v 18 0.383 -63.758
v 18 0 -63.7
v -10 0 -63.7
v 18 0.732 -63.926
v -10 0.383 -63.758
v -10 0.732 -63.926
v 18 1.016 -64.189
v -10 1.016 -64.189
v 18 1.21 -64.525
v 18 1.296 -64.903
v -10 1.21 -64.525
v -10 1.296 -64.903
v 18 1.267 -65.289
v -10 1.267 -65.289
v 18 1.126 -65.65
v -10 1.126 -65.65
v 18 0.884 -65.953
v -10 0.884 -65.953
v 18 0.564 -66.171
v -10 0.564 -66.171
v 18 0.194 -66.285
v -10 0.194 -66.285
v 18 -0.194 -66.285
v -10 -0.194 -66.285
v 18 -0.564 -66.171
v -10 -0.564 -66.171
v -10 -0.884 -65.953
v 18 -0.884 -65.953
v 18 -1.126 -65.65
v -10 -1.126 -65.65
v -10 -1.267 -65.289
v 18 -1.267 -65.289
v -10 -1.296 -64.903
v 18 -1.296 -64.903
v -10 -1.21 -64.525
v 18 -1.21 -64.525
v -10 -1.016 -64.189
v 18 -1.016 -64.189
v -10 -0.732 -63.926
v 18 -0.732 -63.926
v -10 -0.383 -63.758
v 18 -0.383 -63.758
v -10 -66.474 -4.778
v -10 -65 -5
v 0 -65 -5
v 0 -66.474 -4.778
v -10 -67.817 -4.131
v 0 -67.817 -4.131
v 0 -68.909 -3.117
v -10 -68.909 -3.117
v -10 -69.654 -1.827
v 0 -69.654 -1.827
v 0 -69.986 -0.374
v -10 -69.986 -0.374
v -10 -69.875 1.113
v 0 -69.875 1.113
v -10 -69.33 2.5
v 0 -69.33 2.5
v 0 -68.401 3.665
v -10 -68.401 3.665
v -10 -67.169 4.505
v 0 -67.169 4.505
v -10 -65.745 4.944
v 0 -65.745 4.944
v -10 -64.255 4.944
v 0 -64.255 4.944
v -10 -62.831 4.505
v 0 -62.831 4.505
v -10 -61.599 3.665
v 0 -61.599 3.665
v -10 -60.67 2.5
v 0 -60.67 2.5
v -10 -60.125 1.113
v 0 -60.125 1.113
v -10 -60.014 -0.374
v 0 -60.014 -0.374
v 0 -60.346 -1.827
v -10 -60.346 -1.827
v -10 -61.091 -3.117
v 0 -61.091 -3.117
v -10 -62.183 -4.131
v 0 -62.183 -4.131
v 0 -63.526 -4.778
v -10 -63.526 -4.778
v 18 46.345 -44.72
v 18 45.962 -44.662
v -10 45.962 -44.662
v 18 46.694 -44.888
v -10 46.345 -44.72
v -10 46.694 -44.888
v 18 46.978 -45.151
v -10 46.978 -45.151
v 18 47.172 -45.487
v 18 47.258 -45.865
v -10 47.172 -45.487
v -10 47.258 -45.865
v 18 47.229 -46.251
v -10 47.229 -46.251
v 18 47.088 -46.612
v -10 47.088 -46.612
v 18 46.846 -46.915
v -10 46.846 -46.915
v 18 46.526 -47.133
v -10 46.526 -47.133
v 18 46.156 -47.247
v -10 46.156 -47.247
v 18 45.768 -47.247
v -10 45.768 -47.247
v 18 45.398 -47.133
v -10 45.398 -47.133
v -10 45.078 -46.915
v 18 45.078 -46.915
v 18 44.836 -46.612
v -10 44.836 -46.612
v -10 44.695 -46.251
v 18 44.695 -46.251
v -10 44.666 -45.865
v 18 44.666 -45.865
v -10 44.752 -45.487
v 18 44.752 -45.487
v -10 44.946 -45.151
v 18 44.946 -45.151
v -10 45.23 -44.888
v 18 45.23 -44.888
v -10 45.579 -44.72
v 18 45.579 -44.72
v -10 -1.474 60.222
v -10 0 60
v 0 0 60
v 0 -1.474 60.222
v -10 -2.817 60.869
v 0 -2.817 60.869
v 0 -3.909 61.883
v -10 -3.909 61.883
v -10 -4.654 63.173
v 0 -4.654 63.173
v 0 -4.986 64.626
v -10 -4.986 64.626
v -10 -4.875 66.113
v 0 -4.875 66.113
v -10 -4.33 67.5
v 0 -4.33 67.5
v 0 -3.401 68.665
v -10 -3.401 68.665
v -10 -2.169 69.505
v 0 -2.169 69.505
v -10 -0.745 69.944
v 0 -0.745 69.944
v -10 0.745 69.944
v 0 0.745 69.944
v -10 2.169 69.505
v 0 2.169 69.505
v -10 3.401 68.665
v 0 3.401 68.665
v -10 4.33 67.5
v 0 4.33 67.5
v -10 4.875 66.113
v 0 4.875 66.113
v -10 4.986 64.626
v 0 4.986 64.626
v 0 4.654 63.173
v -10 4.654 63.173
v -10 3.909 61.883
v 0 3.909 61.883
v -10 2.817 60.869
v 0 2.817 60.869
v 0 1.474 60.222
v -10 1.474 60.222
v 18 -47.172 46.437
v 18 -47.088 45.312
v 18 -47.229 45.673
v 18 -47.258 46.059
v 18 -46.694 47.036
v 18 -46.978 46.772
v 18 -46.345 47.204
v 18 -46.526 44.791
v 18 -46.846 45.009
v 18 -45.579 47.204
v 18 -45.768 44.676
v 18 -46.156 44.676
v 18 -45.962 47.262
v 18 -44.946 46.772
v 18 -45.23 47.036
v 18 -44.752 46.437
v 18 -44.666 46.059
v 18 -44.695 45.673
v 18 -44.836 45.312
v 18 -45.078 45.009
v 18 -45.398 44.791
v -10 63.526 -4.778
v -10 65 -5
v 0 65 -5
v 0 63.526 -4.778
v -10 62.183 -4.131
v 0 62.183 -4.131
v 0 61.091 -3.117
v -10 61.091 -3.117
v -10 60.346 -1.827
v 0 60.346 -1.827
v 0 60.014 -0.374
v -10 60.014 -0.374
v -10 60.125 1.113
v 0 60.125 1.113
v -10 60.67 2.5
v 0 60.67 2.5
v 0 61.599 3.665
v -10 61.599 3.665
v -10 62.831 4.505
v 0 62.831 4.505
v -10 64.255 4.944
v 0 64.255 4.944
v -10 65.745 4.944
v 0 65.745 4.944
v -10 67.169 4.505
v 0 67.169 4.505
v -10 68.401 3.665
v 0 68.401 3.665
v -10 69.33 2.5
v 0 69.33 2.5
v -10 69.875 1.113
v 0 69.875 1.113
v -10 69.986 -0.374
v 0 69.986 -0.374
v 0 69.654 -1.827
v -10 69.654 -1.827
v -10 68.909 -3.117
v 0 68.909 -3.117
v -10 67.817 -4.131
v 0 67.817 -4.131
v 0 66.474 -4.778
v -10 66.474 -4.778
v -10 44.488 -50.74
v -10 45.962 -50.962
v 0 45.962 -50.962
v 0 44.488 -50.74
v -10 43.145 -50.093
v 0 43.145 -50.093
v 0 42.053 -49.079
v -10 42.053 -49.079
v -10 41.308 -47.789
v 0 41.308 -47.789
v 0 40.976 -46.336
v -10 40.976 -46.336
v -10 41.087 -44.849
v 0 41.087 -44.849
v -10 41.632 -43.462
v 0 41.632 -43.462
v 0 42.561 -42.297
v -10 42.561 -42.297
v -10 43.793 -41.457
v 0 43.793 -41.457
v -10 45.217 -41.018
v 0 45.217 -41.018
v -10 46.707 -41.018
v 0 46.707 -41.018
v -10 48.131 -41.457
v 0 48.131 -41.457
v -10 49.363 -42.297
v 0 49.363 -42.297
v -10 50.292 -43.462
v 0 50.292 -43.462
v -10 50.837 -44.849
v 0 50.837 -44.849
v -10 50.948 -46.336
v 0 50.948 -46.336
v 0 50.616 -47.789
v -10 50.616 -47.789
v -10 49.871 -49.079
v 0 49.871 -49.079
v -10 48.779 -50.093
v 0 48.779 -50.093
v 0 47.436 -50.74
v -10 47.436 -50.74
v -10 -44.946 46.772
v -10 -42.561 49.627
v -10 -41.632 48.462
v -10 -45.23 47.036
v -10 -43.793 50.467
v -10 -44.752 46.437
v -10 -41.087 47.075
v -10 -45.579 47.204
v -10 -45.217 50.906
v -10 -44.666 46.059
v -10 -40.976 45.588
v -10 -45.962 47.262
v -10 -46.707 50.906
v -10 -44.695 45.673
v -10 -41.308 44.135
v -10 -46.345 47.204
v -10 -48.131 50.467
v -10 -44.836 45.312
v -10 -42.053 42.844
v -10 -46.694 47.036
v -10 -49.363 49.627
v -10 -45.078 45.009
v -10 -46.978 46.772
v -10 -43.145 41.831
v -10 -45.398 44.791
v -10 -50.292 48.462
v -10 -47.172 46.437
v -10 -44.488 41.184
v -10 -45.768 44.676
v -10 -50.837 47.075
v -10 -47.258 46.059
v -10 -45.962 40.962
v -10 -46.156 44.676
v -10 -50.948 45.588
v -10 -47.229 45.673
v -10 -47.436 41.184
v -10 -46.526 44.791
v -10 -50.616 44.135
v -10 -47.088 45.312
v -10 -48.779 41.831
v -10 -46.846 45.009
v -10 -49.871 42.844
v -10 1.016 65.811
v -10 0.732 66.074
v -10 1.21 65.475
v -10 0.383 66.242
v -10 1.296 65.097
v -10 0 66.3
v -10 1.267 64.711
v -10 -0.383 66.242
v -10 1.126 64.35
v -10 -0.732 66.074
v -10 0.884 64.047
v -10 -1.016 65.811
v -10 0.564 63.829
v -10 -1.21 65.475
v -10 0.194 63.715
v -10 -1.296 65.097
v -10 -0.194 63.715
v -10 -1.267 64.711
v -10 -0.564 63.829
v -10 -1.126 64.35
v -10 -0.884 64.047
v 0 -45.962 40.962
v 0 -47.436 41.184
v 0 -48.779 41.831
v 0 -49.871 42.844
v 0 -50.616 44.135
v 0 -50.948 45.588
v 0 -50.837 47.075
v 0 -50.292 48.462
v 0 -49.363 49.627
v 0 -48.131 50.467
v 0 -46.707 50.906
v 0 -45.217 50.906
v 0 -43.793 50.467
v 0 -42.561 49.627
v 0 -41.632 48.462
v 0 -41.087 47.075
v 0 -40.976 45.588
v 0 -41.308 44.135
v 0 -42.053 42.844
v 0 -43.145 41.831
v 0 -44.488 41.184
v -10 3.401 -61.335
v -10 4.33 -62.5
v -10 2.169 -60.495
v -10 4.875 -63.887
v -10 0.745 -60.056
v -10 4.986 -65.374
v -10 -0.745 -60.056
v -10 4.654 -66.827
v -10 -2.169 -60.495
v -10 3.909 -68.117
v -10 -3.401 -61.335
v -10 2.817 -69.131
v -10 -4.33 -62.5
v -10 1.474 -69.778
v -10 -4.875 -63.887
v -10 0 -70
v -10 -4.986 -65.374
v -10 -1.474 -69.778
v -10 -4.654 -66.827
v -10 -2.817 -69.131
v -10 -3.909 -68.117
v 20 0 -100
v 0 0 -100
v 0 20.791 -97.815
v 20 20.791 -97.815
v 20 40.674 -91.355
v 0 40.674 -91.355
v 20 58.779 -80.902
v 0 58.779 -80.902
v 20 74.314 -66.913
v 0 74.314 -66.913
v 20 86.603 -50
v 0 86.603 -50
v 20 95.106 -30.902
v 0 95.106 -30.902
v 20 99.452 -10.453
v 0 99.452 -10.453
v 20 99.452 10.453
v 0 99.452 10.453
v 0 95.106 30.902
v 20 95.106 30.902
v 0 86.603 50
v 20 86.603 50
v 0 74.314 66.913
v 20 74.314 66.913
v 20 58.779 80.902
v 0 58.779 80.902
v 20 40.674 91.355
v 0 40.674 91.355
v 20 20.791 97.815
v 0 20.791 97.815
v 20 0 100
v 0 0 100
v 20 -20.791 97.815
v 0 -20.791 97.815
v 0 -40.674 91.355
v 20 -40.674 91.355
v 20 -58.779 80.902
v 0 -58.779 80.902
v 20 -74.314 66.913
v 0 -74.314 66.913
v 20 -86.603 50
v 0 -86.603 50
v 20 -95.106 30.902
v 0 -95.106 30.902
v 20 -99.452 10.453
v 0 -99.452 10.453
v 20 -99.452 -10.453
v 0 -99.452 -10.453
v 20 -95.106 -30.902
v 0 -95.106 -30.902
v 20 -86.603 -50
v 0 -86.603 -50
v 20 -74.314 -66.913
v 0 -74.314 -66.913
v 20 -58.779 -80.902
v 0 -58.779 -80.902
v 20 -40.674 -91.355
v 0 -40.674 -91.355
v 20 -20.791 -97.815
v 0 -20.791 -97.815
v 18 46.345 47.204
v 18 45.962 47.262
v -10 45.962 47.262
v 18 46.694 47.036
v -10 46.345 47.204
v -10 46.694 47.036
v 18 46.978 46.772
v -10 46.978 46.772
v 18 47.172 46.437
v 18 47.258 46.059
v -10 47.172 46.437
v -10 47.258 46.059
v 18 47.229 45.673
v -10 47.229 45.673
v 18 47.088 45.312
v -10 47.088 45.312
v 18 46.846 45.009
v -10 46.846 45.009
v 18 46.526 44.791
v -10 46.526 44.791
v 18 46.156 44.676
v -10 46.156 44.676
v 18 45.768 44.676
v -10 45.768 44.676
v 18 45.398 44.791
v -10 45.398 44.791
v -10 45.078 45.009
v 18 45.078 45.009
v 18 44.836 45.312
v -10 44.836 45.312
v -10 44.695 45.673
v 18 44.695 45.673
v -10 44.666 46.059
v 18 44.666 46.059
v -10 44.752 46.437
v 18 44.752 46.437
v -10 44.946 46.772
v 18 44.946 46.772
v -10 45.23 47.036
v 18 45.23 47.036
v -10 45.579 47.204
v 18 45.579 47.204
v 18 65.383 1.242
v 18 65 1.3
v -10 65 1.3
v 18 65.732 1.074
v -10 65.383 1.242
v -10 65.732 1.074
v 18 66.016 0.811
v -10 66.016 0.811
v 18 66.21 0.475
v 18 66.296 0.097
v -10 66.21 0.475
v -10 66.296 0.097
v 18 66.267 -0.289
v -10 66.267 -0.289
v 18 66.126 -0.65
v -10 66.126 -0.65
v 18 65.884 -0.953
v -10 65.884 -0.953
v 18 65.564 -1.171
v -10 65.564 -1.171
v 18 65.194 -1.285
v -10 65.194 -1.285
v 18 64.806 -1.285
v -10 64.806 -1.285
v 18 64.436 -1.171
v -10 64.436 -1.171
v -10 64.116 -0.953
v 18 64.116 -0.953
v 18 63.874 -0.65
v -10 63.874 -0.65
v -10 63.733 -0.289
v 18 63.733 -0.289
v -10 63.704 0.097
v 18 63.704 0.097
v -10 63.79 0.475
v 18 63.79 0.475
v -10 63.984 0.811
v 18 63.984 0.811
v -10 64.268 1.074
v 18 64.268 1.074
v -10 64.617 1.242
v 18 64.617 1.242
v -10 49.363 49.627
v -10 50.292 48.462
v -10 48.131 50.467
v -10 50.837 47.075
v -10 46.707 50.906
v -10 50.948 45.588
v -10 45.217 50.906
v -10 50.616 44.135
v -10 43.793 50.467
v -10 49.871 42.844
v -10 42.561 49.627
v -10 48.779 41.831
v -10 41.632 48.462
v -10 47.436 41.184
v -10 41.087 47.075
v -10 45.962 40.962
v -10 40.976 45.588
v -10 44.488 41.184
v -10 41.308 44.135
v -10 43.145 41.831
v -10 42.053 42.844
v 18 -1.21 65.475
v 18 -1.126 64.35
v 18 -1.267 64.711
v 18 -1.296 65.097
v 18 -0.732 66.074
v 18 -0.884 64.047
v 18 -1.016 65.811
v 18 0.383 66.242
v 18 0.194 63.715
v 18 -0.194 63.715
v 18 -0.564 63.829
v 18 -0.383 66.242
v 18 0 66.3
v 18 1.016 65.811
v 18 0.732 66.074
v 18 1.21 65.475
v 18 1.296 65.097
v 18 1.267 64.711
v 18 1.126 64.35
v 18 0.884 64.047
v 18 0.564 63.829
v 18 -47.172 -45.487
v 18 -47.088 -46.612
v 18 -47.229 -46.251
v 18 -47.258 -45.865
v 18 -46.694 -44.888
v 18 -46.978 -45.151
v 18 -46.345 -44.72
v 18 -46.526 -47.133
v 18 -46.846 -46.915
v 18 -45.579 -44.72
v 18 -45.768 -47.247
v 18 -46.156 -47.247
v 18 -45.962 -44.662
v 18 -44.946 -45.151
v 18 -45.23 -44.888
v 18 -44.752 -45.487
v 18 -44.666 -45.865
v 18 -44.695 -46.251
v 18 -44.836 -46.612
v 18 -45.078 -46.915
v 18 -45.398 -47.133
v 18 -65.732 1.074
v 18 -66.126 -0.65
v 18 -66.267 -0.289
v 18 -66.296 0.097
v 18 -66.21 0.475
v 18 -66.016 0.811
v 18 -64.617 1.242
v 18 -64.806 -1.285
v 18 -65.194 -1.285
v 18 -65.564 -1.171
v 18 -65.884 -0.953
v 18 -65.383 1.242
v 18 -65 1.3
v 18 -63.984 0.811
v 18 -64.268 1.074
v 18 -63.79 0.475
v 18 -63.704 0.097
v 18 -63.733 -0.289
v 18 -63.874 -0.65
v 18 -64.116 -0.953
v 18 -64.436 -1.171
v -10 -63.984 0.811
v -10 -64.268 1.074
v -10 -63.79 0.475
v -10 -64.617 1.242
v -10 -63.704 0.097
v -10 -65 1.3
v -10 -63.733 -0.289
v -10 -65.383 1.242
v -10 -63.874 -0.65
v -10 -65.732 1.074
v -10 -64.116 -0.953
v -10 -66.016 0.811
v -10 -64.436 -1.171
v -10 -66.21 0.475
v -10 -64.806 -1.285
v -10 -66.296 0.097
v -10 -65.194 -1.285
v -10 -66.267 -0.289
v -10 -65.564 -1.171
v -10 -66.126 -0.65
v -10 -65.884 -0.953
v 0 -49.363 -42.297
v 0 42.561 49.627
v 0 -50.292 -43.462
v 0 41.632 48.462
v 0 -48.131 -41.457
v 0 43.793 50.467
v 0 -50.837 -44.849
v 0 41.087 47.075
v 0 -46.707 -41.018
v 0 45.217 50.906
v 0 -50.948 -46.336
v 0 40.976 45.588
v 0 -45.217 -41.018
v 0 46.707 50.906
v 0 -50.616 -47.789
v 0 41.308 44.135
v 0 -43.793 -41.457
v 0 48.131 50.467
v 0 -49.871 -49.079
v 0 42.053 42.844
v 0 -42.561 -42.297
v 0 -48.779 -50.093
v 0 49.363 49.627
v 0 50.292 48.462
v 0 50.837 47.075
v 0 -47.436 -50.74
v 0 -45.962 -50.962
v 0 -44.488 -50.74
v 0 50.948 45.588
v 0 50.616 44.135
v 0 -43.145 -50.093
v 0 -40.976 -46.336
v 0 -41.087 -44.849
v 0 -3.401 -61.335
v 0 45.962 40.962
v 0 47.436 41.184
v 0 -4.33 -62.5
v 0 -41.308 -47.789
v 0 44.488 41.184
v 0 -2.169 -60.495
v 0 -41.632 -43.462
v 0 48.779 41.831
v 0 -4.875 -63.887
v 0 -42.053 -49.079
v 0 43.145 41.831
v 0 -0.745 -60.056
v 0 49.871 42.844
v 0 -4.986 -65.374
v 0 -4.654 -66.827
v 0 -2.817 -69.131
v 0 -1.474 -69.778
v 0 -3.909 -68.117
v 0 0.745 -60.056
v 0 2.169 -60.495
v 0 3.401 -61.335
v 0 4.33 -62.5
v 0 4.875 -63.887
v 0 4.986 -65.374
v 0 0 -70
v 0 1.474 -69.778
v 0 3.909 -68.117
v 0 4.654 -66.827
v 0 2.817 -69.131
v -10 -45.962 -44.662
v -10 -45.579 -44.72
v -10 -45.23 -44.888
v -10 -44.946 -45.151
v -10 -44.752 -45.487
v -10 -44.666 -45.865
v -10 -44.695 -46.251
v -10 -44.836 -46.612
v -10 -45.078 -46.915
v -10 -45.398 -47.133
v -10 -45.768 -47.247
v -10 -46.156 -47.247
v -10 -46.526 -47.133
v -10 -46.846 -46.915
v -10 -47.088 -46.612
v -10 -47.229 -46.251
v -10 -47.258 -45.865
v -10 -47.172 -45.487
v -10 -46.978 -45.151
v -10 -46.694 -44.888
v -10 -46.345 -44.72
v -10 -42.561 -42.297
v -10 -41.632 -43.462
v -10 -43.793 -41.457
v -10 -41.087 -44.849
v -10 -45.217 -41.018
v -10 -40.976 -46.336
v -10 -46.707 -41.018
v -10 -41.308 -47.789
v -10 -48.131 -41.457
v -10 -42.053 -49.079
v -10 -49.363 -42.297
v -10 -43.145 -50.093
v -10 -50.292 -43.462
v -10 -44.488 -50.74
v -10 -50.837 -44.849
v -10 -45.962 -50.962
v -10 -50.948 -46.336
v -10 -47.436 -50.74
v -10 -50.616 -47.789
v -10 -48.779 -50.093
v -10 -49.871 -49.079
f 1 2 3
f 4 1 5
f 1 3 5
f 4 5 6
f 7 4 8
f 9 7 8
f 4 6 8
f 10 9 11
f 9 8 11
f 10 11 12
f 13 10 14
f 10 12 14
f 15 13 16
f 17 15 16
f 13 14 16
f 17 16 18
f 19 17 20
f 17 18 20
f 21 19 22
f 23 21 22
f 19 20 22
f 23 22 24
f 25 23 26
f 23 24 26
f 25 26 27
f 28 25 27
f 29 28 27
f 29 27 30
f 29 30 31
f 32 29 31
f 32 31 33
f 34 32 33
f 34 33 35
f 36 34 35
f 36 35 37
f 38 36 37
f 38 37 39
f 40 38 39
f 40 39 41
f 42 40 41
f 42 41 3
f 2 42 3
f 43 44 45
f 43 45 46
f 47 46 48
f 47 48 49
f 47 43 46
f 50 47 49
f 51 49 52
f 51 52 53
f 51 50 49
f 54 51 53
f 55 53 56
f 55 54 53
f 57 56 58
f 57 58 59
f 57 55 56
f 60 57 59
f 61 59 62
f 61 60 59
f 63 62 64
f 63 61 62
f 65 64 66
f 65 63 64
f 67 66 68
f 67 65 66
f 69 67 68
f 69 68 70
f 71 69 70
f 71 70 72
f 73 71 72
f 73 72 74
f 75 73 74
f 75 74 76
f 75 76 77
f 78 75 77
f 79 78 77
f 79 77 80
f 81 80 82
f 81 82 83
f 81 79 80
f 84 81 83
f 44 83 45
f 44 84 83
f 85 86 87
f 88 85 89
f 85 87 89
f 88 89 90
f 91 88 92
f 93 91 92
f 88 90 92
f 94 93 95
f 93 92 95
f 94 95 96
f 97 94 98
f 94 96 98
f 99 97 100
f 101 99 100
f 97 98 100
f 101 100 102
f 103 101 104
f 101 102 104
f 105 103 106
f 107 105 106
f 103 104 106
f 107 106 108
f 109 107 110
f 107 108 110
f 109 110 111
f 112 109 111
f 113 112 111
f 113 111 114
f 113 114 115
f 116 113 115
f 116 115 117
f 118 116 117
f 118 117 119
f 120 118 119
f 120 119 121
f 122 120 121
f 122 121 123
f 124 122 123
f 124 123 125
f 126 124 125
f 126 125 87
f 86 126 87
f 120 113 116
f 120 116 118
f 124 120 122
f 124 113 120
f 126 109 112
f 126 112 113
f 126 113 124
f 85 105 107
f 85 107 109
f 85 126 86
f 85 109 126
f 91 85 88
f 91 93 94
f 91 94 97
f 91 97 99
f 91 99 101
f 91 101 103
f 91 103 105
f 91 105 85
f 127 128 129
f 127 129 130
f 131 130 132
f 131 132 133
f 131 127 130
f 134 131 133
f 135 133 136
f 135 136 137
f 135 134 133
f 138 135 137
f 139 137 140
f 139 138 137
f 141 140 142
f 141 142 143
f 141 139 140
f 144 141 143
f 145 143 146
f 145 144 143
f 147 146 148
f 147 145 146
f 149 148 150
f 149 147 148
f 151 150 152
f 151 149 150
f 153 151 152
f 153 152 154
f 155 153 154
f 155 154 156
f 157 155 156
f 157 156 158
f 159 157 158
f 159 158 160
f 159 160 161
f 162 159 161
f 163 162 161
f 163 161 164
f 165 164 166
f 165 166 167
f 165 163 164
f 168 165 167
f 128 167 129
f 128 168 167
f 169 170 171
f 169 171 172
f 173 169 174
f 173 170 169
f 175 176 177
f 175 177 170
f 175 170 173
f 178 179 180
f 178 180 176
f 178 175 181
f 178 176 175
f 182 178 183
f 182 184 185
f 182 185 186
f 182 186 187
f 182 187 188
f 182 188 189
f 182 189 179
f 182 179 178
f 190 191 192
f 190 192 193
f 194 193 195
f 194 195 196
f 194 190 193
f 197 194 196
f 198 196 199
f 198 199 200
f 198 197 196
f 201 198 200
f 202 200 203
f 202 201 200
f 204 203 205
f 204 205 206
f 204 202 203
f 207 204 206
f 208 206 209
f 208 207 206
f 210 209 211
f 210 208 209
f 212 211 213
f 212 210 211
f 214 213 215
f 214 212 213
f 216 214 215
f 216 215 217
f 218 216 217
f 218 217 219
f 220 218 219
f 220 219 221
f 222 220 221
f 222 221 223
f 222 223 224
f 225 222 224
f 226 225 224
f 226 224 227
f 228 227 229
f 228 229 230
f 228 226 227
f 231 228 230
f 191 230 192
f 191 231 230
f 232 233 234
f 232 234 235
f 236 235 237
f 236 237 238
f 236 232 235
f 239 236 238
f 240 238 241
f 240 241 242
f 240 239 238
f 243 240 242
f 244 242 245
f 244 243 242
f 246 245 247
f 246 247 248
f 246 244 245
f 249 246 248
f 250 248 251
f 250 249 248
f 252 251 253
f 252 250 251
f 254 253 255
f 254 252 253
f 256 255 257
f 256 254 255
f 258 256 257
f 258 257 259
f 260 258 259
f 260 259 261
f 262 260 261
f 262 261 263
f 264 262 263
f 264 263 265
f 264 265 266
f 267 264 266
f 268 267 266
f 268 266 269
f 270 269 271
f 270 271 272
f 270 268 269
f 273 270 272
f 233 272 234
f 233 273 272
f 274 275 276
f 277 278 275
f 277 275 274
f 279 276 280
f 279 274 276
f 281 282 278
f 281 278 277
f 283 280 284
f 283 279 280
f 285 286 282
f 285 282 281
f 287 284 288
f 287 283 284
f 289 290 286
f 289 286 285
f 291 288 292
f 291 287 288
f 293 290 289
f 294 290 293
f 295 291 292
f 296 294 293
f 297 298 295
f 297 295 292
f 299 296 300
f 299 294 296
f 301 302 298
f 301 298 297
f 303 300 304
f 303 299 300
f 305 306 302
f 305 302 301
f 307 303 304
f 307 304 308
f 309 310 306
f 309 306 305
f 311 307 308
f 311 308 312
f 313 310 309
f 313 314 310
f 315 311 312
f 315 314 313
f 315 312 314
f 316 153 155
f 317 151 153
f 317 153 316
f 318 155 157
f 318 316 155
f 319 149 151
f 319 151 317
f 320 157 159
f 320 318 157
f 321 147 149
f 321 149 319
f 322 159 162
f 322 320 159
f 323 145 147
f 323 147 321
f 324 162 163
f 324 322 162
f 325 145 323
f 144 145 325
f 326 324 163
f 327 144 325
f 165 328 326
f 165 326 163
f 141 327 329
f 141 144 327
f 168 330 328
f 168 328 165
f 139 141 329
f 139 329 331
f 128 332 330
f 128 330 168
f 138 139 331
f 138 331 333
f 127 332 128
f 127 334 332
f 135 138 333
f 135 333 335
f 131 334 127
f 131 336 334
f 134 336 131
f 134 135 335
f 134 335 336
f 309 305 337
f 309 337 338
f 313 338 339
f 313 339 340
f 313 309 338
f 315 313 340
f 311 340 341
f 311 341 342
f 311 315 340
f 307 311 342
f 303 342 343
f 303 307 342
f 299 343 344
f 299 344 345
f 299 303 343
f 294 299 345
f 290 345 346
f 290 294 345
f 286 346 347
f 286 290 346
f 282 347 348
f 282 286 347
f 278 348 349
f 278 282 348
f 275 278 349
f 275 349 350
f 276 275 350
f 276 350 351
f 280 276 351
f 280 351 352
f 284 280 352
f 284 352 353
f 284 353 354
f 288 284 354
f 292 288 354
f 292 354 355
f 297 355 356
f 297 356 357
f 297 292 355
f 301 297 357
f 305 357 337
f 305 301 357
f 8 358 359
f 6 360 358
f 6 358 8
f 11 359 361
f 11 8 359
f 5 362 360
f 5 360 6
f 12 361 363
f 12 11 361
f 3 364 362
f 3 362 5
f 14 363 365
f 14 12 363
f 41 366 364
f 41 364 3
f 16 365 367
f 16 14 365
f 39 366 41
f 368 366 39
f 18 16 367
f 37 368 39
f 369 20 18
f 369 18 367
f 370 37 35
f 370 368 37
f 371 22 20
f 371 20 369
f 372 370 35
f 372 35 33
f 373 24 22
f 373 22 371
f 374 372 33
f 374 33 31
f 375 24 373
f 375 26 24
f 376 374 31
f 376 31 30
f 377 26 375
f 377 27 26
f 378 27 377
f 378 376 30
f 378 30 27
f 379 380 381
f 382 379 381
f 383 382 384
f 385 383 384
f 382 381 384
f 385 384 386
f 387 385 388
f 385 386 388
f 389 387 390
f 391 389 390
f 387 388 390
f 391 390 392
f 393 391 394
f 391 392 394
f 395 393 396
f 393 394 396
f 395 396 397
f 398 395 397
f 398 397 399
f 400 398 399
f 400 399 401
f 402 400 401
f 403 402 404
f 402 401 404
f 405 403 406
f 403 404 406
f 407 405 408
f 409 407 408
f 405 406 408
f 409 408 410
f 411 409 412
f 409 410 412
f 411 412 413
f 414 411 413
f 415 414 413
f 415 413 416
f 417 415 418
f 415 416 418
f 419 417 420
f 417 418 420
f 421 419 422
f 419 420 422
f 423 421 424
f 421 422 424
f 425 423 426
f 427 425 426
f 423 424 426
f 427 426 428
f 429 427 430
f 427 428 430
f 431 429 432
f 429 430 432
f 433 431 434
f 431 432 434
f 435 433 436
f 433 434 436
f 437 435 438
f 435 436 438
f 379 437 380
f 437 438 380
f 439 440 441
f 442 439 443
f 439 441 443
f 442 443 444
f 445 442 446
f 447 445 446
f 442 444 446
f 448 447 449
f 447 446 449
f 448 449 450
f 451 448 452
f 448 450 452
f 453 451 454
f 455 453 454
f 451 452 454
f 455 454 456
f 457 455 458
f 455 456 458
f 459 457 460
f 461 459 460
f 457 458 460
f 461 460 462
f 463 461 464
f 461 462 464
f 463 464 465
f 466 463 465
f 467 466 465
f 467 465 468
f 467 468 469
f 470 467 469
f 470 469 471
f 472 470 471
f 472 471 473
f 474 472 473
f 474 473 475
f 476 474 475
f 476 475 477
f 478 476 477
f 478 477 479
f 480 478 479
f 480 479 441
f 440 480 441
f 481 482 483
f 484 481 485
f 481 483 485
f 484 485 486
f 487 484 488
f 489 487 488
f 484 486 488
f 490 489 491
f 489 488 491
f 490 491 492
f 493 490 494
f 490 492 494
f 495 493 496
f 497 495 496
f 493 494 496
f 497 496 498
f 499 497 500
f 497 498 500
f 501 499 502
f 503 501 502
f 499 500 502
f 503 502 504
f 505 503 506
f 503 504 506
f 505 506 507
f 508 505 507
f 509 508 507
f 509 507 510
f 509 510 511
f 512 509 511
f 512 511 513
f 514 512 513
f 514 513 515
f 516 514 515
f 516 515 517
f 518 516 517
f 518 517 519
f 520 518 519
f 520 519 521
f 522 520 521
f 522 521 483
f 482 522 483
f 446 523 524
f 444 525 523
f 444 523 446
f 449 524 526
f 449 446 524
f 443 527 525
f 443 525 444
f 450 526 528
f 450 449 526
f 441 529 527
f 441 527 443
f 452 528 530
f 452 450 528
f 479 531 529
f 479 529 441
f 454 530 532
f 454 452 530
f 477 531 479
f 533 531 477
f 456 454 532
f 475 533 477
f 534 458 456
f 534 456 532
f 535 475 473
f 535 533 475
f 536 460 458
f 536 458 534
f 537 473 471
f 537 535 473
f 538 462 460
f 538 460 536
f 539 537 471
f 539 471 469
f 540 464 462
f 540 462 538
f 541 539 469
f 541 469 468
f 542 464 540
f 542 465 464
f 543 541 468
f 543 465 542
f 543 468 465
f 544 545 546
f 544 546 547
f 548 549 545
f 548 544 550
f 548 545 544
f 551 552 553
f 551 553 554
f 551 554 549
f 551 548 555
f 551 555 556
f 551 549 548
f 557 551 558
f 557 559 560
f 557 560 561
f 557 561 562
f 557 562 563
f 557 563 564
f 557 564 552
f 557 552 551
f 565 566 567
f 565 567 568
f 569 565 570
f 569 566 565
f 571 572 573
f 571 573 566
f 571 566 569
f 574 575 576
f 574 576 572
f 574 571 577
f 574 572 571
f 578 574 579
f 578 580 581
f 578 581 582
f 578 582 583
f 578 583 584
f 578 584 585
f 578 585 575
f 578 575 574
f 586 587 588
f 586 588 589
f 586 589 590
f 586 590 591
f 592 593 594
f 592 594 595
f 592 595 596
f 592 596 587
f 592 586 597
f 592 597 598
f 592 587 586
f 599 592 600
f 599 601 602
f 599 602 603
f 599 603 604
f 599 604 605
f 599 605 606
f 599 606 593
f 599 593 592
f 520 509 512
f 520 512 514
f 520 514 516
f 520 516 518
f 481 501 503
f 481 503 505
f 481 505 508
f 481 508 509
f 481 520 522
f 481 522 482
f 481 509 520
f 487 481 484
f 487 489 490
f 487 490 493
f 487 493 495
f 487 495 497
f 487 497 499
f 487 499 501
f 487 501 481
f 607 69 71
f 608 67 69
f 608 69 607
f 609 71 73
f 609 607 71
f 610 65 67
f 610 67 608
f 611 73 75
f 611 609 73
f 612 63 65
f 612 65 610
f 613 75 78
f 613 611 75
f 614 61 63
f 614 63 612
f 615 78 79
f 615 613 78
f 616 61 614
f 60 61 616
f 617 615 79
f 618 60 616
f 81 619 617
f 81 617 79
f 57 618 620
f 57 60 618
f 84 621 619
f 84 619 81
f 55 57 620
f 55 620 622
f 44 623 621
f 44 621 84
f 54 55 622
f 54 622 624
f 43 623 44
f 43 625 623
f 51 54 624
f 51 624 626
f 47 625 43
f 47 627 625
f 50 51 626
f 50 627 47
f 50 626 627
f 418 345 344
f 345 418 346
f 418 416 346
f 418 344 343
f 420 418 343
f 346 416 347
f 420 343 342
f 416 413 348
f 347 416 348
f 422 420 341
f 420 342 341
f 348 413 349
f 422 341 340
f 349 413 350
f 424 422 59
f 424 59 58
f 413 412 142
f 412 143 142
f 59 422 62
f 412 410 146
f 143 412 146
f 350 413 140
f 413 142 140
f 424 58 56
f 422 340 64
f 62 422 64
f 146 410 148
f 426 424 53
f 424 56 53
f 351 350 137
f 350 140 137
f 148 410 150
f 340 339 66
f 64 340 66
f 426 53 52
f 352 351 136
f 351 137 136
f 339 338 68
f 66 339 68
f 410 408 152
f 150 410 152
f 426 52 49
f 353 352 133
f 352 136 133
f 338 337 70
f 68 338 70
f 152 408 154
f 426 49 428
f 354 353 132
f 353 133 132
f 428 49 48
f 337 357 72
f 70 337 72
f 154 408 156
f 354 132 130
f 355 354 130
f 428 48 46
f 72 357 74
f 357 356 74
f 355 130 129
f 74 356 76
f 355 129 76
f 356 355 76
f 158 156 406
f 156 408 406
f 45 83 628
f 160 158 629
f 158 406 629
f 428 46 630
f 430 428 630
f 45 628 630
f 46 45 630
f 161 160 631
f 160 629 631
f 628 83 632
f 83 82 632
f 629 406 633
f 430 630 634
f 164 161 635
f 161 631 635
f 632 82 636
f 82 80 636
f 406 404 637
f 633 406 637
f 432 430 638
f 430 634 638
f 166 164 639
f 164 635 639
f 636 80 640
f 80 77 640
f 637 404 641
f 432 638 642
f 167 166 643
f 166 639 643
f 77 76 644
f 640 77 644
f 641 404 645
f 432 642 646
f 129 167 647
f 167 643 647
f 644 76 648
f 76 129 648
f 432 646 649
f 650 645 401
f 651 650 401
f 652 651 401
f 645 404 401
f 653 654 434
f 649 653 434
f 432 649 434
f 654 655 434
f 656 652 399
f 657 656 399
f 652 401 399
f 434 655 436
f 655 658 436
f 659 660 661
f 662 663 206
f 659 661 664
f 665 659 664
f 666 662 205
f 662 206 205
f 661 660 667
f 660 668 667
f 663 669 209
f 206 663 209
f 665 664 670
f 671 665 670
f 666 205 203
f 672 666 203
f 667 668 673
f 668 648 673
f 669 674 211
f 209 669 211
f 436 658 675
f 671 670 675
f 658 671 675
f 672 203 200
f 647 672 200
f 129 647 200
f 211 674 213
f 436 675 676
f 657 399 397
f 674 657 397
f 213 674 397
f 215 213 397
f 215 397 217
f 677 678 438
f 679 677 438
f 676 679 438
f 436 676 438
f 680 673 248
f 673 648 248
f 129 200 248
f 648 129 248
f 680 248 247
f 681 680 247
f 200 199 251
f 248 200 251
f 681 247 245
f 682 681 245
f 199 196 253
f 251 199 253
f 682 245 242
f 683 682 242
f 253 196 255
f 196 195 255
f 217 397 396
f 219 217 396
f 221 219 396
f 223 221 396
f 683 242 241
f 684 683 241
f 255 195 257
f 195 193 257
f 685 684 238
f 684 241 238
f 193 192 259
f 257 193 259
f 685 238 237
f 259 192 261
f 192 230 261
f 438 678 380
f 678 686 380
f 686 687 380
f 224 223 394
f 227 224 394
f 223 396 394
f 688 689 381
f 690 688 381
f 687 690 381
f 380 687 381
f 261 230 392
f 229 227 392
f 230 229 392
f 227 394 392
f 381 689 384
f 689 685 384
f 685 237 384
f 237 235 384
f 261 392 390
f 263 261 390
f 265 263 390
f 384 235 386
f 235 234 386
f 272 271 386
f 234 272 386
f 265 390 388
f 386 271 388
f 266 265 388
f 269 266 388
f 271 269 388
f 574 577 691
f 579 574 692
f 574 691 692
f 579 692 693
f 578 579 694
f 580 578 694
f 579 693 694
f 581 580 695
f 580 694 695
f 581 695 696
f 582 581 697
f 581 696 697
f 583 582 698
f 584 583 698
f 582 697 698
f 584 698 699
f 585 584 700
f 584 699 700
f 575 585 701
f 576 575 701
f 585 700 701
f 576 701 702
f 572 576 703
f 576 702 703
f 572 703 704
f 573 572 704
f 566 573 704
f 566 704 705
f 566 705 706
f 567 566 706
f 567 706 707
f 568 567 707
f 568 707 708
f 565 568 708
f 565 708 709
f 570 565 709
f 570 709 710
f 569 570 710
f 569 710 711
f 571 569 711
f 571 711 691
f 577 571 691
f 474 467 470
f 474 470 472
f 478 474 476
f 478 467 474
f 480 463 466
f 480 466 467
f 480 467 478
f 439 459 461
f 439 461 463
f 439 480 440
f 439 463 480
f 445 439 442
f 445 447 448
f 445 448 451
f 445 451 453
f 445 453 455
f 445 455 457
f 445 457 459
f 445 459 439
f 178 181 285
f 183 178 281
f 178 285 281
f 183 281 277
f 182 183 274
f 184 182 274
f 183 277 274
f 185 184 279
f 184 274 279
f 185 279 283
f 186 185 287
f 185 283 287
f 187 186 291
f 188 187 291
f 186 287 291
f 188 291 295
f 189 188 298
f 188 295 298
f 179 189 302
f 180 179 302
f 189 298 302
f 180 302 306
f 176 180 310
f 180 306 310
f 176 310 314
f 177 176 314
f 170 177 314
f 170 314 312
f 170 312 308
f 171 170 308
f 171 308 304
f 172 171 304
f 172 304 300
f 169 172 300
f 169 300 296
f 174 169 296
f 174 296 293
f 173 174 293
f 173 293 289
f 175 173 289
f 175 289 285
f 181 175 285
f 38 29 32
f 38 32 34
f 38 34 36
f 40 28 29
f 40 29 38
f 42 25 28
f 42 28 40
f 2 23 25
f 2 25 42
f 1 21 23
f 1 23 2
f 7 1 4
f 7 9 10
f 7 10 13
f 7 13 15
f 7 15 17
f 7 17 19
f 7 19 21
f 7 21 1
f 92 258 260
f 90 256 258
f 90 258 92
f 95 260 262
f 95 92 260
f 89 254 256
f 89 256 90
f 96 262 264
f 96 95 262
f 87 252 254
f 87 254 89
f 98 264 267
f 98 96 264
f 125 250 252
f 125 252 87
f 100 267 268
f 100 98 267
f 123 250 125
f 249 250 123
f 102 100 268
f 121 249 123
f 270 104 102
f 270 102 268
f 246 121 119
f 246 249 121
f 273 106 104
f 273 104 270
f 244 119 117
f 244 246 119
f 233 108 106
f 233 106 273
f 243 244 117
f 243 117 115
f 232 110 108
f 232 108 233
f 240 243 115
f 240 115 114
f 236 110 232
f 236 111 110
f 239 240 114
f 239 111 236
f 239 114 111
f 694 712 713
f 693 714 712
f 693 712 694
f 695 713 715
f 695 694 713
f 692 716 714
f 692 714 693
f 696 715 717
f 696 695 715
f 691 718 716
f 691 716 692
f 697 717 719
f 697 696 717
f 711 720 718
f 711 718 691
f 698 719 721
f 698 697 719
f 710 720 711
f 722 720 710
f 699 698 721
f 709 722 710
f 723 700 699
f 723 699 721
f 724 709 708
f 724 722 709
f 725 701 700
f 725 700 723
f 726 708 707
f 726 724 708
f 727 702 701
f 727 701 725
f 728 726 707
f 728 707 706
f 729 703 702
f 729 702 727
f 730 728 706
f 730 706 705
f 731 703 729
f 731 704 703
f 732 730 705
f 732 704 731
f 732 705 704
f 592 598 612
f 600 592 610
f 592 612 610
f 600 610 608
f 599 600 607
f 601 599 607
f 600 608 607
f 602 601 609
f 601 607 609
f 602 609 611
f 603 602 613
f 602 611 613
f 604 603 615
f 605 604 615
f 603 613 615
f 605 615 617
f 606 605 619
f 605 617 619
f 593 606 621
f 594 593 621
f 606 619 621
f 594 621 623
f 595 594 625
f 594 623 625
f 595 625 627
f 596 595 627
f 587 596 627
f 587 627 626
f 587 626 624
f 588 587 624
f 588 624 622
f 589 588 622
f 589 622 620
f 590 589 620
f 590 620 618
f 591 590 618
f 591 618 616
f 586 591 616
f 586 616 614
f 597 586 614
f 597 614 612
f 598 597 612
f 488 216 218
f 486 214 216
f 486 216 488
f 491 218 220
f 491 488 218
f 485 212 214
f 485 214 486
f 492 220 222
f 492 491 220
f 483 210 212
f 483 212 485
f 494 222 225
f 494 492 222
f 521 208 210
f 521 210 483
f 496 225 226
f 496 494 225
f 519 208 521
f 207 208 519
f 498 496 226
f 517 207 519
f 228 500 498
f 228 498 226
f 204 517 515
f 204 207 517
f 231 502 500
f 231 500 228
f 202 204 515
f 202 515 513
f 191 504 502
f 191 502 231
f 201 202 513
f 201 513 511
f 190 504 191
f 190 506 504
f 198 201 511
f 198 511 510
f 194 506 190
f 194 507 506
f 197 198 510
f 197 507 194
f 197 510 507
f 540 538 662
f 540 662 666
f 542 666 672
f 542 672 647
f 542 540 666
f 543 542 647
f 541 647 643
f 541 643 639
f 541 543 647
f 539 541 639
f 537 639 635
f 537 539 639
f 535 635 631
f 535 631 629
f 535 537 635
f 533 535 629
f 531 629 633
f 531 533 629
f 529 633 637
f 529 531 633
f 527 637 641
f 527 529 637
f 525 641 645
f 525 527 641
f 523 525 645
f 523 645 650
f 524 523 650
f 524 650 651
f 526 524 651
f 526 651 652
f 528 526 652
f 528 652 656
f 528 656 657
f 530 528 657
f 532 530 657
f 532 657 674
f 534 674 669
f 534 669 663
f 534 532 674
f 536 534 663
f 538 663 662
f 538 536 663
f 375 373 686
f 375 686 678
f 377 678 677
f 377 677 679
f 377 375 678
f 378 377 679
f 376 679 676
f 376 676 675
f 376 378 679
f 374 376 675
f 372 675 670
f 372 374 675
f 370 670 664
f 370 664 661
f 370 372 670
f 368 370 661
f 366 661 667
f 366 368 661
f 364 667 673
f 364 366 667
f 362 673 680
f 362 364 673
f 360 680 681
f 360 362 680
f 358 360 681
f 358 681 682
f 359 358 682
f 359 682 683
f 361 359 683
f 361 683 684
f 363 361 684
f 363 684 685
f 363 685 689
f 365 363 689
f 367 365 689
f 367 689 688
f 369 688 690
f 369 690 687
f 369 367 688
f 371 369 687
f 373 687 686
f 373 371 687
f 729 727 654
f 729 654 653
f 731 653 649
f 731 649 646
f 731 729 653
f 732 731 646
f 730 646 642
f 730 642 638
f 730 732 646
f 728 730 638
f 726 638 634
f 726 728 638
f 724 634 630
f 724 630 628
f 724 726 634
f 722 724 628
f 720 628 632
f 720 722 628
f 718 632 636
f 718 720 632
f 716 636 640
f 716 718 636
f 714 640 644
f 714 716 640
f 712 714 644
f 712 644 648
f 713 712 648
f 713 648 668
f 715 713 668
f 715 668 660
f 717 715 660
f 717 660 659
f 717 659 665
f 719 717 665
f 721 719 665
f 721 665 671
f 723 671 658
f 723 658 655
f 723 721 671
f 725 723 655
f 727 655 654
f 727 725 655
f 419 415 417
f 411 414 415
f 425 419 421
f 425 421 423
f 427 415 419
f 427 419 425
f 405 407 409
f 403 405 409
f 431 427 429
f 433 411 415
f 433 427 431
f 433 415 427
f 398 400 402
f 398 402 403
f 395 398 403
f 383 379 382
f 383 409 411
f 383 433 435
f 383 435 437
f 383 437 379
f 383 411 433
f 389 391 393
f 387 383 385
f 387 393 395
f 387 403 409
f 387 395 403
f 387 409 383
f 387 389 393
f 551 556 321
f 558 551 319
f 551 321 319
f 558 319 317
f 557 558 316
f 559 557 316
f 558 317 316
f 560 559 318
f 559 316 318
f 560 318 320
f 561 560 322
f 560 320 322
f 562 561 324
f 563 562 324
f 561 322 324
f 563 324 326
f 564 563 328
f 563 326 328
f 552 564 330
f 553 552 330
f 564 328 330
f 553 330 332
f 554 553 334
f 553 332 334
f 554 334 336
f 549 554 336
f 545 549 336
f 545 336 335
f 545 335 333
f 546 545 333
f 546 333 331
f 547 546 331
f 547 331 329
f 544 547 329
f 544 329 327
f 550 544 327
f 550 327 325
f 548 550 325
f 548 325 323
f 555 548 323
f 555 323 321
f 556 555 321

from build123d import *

# Parameters (mm, degrees)
SKETCH1_R           = 100
BOSS_EXTRUDE1_DEPTH = 20
SKETCH4_R           = 1.3
CUT_EXTRUDE2_DEPTH  = 18
BOSS_EXTRUDE3_START = 10
SKETCH5_R           = 5
SKETCH5_R_2         = 1.3
BOSS_EXTRUDE3_DEPTH = 10


with BuildPart() as part:
    # Sketch1 → Boss-Extrude1 (new body)
    with BuildSketch(Plane(origin=(0, 0, 0), x_dir=(0, 0, -1), z_dir=(1, 0, 0))):
        Circle(SKETCH1_R)
    extrude(amount=BOSS_EXTRUDE1_DEPTH)

    # Sketch4 → Cut-Extrude2 (cut)
    with BuildSketch(Plane.ZY):
        with Locations((0, 65)):
            Circle(SKETCH4_R)
        with Locations((45.961940777, 45.961940777)):
            Circle(SKETCH4_R)
        with Locations((65, 0)):
            Circle(SKETCH4_R)
        with Locations((45.961940777, -45.961940777)):
            Circle(SKETCH4_R)
        with Locations((0, -65)):
            Circle(SKETCH4_R)
        with Locations((-45.961940777, -45.961940777)):
            Circle(SKETCH4_R)
        with Locations((-65, 0)):
            Circle(SKETCH4_R)
        with Locations((-45.961940777, 45.961940777)):
            Circle(SKETCH4_R)
    extrude(amount=-CUT_EXTRUDE2_DEPTH, mode=Mode.SUBTRACT)

    # Sketch5 → Boss-Extrude3 (add)
    # profile 1 of 8: a face of its own
    with BuildSketch(Plane.ZY.offset(BOSS_EXTRUDE3_START)):
        with Locations(Location((0, 65, 0), (0, 0, 180))):
            Circle(SKETCH5_R)
        with Locations((0, 65)):
            Circle(SKETCH5_R_2, mode=Mode.SUBTRACT)
    # profile 2 of 8: a face of its own
    with BuildSketch(Plane.ZY.offset(BOSS_EXTRUDE3_START)):
        with Locations(Location((45.961940777, 45.961940777, 0), (0, 0, 180))):
            Circle(SKETCH5_R)
        with Locations((45.961940777, 45.961940777)):
            Circle(SKETCH5_R_2, mode=Mode.SUBTRACT)
    # profile 3 of 8: a face of its own
    with BuildSketch(Plane.ZY.offset(BOSS_EXTRUDE3_START)):
        with Locations(Location((65, 0, 0), (0, 0, 180))):
            Circle(SKETCH5_R)
        with Locations((65, 0)):
            Circle(SKETCH5_R_2, mode=Mode.SUBTRACT)
    # profile 4 of 8: a face of its own
    with BuildSketch(Plane.ZY.offset(BOSS_EXTRUDE3_START)):
        with Locations(Location((45.961940777, -45.961940777, 0), (0, 0, 180))):
            Circle(SKETCH5_R)
        with Locations((45.961940777, -45.961940777)):
            Circle(SKETCH5_R_2, mode=Mode.SUBTRACT)
    # profile 5 of 8: a face of its own
    with BuildSketch(Plane.ZY.offset(BOSS_EXTRUDE3_START)):
        with Locations(Location((0, -65, 0), (0, 0, 180))):
            Circle(SKETCH5_R)
        with Locations((0, -65)):
            Circle(SKETCH5_R_2, mode=Mode.SUBTRACT)
    # profile 6 of 8: a face of its own
    with BuildSketch(Plane.ZY.offset(BOSS_EXTRUDE3_START)):
        with Locations(Location((-45.961940777, -45.961940777, 0), (0, 0, 180))):
            Circle(SKETCH5_R)
        with Locations((-45.961940777, -45.961940777)):
            Circle(SKETCH5_R_2, mode=Mode.SUBTRACT)
    # profile 7 of 8: a face of its own
    with BuildSketch(Plane.ZY.offset(BOSS_EXTRUDE3_START)):
        with Locations(Location((-65, 0, 0), (0, 0, 180))):
            Circle(SKETCH5_R)
        with Locations((-65, 0)):
            Circle(SKETCH5_R_2, mode=Mode.SUBTRACT)
    # profile 8 of 8: a face of its own
    with BuildSketch(Plane.ZY.offset(BOSS_EXTRUDE3_START)):
        with Locations(Location((-45.961940777, 45.961940777, 0), (0, 0, 180))):
            Circle(SKETCH5_R)
        with Locations((-45.961940777, 45.961940777)):
            Circle(SKETCH5_R_2, mode=Mode.SUBTRACT)
    extrude(amount=-BOSS_EXTRUDE3_DEPTH)


solid = part.part
